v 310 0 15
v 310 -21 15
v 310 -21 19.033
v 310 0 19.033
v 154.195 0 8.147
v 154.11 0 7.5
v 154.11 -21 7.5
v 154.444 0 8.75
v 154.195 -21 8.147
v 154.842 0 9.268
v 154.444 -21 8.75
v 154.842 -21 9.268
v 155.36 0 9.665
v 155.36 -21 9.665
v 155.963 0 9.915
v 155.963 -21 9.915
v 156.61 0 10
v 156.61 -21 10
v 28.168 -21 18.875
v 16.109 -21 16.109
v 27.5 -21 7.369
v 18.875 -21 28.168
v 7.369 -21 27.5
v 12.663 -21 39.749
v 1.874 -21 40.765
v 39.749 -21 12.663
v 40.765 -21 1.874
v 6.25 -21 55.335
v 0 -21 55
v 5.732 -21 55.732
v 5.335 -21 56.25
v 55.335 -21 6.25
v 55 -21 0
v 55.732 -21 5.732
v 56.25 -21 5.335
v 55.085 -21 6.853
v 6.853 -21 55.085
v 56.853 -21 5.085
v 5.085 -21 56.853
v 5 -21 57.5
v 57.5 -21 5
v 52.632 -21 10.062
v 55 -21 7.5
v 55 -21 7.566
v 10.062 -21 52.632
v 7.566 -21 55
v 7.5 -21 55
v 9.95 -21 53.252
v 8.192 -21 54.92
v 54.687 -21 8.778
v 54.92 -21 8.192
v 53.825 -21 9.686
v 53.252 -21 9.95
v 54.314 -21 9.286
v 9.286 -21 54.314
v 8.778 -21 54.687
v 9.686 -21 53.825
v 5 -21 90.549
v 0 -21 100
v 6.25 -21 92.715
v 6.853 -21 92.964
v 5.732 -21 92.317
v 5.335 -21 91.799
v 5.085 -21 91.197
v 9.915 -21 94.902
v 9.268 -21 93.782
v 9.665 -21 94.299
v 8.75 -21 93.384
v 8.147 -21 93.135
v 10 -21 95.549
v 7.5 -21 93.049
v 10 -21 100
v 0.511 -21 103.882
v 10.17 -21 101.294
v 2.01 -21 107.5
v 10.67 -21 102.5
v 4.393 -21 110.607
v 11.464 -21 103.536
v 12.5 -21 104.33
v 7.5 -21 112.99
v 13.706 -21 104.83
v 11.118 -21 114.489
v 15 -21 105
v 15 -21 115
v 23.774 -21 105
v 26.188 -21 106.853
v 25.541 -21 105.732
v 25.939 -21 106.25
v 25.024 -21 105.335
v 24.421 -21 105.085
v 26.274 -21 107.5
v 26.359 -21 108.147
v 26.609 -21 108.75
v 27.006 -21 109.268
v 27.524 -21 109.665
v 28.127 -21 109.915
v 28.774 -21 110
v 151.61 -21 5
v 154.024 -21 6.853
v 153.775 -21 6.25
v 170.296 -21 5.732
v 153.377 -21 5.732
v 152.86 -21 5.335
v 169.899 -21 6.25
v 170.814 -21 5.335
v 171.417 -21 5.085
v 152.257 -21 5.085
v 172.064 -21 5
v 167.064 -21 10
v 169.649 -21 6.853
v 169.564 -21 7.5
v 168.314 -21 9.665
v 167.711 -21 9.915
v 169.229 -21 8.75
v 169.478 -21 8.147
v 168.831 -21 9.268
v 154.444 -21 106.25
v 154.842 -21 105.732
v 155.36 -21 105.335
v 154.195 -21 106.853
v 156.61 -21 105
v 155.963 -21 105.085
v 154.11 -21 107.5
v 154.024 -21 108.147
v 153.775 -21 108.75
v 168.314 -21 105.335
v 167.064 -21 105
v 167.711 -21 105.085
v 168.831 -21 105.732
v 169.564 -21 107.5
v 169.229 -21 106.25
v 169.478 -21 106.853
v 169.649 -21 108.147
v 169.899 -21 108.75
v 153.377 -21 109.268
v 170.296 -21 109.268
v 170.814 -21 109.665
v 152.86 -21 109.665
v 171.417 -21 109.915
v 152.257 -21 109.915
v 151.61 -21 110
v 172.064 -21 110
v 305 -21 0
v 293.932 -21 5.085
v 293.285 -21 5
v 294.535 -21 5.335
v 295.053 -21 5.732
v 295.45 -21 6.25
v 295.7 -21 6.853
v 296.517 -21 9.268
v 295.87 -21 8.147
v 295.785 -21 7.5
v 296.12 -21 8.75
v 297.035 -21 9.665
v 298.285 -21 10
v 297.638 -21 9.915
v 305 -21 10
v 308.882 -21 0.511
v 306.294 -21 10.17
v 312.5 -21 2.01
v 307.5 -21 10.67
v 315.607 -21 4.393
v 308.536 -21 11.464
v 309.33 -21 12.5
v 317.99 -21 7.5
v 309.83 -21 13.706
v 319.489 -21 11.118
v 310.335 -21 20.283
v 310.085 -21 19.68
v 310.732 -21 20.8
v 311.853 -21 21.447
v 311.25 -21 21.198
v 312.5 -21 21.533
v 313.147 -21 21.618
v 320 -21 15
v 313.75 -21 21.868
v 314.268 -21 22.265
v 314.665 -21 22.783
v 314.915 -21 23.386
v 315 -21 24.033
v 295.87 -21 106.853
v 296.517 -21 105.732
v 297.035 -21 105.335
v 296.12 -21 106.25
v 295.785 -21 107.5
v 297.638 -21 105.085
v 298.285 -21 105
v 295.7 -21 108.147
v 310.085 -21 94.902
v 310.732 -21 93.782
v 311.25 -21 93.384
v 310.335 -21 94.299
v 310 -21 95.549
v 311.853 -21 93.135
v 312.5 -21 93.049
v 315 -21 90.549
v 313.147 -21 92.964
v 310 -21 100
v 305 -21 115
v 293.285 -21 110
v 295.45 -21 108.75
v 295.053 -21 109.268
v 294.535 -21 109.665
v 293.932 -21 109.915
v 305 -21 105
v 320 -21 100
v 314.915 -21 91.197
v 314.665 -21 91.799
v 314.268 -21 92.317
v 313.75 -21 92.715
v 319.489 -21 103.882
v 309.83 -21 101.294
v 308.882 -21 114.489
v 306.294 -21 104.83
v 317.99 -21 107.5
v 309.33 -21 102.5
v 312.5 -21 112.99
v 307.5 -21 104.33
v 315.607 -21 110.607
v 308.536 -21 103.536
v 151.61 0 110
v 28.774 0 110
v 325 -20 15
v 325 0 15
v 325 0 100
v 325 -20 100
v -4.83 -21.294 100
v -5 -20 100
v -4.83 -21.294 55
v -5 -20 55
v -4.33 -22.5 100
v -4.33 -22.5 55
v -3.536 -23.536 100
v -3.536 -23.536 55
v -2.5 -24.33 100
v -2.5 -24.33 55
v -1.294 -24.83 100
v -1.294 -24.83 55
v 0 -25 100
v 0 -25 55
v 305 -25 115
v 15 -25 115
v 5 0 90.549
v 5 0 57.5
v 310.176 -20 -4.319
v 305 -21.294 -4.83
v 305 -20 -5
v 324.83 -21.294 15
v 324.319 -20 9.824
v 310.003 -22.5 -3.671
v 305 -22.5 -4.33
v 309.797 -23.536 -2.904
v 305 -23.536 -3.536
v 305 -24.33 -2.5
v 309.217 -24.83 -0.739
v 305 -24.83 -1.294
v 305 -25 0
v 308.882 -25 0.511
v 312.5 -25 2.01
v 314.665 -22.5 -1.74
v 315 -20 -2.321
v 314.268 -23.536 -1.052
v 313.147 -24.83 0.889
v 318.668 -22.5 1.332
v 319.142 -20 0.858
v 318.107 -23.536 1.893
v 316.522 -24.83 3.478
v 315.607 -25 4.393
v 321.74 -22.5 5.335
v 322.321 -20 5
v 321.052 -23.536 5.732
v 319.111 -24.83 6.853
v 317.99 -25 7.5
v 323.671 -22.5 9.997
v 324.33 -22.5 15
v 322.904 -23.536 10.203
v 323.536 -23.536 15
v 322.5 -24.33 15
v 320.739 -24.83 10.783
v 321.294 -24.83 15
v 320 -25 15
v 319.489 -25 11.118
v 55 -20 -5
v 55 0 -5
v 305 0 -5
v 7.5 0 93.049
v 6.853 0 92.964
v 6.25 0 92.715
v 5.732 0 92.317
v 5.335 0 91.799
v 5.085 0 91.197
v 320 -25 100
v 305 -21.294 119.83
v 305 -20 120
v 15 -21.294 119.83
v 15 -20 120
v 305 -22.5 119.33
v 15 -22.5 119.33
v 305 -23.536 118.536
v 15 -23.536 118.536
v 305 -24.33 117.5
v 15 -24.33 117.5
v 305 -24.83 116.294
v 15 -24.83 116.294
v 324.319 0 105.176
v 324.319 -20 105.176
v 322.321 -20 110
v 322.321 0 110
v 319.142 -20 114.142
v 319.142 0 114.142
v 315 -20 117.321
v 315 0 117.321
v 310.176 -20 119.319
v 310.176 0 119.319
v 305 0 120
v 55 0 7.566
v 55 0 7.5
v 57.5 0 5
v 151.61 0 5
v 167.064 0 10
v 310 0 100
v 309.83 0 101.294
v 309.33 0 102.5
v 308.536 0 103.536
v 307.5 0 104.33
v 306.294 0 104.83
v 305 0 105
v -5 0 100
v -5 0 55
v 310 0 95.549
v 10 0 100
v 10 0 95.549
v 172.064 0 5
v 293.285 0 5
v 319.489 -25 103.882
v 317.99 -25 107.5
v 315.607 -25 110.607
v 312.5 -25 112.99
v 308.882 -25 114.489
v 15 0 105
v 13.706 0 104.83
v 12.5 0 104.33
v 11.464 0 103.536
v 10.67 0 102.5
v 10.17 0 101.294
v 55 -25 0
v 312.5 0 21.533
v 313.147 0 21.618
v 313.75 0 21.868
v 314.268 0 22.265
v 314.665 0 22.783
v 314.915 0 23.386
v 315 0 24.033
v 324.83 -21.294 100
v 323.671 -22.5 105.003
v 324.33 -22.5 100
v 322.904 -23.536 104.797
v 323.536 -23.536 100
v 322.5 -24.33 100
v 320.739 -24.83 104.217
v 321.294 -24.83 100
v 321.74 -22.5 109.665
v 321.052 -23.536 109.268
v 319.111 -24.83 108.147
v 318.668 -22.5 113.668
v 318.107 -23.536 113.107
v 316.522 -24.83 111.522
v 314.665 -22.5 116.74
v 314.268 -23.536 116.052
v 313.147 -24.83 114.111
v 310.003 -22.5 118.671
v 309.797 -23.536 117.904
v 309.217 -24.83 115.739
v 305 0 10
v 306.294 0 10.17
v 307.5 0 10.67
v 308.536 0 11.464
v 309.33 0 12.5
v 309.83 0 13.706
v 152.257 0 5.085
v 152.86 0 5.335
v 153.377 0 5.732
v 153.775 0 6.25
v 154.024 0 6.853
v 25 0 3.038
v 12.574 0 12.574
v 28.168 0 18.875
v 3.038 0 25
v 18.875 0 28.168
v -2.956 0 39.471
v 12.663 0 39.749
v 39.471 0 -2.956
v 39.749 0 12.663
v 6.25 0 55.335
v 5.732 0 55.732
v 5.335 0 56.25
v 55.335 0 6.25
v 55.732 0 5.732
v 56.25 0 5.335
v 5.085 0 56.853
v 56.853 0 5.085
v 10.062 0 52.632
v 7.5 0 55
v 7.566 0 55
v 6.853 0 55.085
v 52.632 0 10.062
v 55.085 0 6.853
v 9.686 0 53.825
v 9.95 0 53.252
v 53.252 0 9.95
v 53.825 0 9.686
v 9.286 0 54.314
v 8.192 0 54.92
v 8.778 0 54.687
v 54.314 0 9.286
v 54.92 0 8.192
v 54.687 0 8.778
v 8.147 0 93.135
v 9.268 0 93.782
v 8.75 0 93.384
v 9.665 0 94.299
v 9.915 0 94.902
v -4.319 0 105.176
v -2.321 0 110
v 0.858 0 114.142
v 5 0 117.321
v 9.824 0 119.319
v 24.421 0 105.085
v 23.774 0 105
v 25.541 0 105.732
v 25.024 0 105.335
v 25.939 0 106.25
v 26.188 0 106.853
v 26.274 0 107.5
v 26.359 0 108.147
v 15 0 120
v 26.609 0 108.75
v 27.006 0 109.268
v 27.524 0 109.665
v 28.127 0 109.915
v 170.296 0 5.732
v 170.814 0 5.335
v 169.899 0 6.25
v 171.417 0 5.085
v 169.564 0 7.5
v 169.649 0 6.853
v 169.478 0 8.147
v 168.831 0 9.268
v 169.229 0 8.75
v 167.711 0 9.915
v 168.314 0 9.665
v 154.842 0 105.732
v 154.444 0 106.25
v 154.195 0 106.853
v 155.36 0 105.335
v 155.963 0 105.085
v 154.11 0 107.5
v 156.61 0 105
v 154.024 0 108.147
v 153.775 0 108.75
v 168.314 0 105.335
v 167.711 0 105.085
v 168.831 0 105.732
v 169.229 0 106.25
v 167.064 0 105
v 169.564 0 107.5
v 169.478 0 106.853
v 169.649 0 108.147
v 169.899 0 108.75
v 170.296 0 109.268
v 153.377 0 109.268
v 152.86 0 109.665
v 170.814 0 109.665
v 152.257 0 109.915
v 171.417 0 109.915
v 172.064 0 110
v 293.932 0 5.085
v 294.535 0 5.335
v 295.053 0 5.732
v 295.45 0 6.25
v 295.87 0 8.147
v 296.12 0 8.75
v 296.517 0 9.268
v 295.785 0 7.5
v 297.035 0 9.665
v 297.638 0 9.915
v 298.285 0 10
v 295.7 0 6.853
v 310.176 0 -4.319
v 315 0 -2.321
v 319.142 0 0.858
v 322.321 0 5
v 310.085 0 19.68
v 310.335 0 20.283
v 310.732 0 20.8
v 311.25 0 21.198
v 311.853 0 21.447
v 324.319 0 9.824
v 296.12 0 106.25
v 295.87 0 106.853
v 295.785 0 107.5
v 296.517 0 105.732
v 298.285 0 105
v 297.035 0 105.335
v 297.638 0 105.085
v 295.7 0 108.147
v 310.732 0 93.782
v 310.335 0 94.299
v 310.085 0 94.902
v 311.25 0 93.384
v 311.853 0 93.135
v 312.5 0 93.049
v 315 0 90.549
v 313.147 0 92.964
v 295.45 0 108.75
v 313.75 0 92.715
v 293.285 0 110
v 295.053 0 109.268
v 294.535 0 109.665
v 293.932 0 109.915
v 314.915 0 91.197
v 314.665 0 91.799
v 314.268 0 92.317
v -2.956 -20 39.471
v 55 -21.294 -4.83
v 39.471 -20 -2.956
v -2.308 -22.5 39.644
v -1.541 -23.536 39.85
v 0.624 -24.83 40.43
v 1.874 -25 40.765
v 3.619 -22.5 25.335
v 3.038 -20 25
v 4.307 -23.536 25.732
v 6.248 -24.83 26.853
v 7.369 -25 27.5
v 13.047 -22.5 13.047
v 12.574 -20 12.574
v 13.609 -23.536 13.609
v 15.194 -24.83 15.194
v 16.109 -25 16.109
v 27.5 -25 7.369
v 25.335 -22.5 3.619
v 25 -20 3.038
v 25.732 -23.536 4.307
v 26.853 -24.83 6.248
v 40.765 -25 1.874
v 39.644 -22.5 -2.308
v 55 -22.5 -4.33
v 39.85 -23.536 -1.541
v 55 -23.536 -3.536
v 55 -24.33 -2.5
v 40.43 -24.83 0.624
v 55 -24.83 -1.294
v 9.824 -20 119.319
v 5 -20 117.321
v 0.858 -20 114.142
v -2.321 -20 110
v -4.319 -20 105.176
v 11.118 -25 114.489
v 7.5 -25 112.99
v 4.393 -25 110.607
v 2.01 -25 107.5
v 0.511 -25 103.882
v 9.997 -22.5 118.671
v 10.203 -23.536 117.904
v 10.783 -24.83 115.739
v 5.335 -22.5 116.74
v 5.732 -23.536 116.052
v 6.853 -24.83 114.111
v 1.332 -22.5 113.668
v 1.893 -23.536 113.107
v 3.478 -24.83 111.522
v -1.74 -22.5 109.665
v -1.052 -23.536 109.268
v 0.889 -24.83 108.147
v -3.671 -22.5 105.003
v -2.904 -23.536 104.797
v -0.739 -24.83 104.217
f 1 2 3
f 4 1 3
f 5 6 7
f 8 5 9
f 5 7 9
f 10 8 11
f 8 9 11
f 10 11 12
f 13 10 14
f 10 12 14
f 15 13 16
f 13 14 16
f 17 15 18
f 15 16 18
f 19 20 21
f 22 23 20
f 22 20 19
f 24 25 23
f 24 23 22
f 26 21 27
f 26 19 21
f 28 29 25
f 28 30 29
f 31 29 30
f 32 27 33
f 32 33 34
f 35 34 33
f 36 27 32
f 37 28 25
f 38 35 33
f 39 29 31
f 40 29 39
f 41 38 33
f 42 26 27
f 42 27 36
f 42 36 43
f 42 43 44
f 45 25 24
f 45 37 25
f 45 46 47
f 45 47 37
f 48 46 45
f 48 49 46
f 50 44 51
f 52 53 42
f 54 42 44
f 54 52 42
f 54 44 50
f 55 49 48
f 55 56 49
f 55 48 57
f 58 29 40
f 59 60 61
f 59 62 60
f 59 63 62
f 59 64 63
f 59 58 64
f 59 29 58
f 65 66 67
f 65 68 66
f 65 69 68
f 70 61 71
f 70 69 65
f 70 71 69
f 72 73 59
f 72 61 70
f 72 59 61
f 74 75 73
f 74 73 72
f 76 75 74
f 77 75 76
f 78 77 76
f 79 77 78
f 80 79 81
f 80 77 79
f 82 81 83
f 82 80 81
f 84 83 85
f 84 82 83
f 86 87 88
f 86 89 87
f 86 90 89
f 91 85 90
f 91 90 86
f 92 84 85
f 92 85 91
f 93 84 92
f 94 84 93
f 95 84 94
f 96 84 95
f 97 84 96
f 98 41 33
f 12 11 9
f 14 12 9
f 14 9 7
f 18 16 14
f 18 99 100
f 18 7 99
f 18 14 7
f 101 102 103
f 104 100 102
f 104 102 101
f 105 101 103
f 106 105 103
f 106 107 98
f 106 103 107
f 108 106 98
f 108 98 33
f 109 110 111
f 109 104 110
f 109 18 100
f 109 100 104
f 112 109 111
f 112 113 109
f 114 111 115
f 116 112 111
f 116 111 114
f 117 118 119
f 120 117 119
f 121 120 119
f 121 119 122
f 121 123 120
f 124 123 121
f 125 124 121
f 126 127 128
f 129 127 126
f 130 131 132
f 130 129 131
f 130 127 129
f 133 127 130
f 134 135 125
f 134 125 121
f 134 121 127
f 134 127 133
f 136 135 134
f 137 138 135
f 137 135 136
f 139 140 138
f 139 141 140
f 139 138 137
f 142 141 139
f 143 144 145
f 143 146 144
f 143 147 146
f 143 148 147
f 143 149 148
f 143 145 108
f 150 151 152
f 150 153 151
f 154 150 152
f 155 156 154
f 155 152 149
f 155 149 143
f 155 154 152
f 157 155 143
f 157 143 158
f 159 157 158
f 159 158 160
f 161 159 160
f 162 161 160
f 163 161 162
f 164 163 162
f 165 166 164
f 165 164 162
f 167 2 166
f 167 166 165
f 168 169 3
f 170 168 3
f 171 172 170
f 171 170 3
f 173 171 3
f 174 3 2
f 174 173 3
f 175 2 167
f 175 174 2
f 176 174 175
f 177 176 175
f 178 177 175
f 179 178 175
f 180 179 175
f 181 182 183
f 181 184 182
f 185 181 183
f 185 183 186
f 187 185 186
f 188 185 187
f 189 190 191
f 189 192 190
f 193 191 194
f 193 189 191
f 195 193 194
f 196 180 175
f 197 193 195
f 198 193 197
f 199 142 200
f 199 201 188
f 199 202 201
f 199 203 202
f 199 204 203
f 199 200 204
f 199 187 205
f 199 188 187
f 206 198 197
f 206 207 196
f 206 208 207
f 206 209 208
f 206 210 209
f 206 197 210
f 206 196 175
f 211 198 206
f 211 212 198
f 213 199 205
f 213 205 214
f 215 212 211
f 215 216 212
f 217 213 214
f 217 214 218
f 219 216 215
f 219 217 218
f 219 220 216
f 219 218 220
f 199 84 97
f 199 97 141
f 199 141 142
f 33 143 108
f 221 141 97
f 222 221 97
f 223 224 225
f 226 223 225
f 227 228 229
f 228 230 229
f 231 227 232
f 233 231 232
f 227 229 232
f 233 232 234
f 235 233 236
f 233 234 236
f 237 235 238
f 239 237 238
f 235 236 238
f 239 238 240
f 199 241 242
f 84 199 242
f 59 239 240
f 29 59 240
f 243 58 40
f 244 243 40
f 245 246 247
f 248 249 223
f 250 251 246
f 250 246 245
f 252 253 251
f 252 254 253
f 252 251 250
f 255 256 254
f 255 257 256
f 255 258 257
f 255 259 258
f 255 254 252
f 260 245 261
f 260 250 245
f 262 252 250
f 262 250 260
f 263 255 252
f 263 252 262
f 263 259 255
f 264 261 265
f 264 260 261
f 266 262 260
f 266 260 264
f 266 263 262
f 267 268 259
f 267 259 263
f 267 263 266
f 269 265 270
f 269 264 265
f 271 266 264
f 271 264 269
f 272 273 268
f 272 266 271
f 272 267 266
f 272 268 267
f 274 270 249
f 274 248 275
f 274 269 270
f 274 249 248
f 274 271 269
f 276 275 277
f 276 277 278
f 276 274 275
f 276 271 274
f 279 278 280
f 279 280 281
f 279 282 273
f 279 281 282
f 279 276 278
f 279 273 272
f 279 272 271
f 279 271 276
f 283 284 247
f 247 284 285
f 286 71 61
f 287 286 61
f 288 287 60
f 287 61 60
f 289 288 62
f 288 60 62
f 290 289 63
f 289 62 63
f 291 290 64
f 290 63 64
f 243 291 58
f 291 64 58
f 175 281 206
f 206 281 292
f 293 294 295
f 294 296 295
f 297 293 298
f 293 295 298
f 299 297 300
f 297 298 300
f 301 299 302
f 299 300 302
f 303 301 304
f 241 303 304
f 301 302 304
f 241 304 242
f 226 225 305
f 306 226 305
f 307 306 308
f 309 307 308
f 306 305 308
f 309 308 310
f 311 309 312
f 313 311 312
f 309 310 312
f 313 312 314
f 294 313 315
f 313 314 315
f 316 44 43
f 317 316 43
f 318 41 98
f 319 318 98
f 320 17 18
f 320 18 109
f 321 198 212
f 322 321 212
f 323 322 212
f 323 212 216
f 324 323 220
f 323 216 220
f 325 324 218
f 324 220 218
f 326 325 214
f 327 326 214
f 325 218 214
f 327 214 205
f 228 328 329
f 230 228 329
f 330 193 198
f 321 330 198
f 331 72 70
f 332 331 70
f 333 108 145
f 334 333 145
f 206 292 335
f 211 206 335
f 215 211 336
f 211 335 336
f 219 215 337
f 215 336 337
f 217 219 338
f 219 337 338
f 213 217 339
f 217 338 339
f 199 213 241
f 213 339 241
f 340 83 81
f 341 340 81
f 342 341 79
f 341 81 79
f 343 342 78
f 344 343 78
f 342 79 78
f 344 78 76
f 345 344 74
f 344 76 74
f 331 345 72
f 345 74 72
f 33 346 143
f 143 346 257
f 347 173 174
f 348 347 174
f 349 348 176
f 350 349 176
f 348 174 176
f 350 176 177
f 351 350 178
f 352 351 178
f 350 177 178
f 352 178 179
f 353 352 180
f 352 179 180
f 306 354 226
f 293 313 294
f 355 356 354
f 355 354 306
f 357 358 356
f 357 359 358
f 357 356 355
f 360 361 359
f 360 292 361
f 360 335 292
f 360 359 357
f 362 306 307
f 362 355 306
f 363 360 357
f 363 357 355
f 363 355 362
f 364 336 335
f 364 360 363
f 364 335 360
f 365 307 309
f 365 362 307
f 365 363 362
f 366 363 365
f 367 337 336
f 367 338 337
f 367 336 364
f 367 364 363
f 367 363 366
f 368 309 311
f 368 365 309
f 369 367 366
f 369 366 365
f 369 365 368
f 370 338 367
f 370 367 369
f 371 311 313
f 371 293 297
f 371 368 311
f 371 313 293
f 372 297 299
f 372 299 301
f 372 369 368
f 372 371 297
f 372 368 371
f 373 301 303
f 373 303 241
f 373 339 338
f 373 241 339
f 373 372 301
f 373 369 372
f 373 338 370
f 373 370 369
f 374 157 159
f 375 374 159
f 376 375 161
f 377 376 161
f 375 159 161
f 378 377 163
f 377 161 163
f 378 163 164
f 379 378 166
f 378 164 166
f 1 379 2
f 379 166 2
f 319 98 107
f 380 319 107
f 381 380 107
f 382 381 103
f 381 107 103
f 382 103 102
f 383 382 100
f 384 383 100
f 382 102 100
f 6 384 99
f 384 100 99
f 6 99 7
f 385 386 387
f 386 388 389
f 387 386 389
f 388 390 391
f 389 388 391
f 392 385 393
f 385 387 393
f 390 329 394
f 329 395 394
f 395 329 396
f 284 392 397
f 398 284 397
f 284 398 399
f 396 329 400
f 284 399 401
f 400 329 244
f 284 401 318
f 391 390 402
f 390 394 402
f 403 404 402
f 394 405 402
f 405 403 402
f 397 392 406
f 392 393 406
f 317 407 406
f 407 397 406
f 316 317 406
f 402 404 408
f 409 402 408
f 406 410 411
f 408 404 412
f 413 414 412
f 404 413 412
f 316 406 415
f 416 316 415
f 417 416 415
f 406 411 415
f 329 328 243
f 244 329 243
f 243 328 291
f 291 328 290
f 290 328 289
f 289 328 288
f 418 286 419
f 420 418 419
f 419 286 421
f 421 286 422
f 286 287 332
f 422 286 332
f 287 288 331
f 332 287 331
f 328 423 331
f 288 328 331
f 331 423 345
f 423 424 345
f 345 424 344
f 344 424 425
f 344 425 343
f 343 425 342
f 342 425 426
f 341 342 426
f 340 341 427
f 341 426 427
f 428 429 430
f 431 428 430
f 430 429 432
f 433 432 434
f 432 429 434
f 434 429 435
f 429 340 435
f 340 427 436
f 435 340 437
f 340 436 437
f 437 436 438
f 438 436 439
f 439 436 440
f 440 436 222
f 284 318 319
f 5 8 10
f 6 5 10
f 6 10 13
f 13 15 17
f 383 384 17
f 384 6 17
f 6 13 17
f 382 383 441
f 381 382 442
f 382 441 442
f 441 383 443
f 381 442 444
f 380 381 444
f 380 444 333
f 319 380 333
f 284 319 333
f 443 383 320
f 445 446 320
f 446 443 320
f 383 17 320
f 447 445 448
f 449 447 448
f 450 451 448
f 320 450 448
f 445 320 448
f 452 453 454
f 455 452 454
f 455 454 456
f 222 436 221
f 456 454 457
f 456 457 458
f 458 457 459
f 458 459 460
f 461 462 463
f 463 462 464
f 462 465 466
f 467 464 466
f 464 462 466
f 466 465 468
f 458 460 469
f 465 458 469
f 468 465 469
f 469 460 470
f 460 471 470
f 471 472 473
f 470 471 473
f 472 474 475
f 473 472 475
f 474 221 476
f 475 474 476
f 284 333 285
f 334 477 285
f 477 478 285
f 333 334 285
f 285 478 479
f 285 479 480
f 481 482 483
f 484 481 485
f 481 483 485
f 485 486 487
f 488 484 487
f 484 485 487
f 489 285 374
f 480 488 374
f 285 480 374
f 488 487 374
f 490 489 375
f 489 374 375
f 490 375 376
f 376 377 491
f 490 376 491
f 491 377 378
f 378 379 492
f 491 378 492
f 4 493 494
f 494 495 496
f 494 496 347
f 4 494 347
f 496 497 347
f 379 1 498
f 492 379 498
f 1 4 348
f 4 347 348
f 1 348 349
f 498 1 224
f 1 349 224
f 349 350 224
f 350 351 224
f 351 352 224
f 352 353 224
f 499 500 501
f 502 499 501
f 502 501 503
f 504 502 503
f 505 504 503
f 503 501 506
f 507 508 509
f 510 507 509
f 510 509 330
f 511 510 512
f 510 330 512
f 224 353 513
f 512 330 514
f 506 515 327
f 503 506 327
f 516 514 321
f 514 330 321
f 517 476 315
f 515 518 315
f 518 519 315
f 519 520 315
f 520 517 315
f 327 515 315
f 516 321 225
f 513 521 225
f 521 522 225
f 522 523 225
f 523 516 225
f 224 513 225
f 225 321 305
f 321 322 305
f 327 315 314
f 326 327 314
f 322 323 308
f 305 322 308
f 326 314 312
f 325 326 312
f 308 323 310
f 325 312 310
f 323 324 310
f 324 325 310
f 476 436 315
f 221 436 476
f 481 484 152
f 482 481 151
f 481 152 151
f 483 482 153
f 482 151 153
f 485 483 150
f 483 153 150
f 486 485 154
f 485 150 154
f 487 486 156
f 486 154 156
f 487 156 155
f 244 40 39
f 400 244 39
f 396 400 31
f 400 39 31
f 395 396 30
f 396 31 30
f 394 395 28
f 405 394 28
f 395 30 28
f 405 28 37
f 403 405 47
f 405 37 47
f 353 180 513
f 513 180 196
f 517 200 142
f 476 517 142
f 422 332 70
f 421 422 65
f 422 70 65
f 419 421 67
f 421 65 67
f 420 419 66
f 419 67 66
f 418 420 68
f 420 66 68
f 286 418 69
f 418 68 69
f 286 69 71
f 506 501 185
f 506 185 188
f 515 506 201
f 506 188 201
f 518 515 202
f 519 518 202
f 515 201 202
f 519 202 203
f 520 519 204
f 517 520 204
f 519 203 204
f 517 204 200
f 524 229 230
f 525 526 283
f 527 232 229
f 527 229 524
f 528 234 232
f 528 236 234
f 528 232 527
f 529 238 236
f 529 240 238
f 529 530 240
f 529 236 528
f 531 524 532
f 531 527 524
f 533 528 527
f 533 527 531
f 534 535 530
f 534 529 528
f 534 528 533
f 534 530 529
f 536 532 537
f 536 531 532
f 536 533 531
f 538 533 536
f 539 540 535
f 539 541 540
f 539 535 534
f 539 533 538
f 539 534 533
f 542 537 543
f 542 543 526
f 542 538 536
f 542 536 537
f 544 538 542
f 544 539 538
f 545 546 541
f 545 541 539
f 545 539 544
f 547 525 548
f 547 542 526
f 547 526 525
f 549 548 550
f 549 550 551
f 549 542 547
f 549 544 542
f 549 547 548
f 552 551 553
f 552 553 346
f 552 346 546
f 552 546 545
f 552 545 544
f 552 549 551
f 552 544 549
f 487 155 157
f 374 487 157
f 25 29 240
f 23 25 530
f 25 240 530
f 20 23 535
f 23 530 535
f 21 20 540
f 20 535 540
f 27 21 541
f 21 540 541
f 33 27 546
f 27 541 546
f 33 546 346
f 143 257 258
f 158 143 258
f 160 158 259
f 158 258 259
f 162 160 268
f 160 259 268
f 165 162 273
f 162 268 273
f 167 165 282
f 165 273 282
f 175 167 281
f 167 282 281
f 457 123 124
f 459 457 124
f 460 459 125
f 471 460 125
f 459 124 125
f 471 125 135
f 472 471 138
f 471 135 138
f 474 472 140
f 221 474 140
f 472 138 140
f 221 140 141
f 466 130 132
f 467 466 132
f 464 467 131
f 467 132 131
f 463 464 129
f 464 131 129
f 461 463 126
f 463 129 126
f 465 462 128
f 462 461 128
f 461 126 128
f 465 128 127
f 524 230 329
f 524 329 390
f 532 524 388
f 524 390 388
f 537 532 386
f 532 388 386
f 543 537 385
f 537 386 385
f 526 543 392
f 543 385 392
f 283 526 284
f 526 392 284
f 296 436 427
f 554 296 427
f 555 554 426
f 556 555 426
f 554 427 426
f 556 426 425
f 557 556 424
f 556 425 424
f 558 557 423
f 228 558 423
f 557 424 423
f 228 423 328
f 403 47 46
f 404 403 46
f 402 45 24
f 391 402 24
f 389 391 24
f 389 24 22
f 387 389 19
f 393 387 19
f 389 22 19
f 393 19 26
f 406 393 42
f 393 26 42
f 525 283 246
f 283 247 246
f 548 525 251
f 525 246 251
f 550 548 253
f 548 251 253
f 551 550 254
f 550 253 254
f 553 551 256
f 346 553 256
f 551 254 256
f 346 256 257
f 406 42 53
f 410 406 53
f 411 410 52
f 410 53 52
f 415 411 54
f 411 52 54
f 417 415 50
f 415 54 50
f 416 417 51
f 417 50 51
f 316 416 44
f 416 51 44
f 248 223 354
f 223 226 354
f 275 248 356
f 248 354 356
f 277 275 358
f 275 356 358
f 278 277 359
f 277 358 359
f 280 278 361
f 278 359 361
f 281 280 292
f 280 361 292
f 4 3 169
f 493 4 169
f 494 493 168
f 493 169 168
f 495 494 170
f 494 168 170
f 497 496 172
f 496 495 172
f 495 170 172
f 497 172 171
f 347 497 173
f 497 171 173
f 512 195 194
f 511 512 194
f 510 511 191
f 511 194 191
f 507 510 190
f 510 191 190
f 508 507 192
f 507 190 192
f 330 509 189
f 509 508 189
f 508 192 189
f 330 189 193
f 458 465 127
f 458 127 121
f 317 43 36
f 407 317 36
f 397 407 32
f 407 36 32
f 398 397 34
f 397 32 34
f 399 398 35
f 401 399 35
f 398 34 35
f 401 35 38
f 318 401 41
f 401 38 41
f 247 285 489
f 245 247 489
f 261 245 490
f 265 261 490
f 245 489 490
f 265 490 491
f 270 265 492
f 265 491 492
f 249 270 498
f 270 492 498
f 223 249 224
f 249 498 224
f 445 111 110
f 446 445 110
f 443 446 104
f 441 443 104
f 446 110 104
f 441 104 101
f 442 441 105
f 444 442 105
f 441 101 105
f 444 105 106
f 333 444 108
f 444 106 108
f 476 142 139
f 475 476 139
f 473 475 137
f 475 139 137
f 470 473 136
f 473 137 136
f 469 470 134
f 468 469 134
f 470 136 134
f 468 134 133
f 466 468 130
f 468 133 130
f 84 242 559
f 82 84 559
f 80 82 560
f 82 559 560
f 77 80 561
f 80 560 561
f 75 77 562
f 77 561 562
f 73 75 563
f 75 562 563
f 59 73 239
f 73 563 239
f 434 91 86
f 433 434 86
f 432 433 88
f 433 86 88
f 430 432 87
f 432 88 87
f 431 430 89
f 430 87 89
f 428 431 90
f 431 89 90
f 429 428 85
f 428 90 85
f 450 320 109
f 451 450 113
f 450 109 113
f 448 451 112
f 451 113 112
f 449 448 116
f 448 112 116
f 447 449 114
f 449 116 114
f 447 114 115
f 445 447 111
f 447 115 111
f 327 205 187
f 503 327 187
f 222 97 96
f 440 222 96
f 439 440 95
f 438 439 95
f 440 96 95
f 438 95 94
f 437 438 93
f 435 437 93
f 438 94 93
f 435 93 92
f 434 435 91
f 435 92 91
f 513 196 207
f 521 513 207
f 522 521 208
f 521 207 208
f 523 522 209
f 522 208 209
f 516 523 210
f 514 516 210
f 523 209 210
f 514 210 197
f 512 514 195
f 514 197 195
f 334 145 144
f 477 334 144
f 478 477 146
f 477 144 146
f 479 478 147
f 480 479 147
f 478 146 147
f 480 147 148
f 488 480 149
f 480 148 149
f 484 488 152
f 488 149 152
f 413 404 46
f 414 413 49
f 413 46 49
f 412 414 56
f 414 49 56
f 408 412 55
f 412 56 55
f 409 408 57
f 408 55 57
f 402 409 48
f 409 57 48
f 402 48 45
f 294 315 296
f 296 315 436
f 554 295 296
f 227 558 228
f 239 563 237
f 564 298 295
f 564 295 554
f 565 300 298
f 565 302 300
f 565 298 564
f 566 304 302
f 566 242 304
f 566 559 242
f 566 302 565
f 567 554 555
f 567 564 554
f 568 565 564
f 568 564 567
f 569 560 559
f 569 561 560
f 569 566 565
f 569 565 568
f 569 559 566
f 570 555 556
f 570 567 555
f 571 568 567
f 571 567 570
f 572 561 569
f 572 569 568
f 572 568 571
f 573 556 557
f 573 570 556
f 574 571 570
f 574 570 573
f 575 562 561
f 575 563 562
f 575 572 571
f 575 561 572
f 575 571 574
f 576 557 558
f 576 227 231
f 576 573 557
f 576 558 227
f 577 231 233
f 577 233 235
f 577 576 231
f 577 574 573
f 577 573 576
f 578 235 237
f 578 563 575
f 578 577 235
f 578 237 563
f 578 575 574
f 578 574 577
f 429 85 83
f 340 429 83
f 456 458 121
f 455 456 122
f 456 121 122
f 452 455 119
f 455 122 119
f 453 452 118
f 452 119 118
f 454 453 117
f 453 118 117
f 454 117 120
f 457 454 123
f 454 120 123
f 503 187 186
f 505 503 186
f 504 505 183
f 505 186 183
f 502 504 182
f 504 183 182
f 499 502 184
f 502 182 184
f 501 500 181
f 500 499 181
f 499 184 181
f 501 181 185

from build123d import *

# Parameters (mm, degrees)
F2_DEPTH = 25
F3_R     = 5
F4_DEPTH = 4
F6_DEPTH = 25


with BuildPart() as f2:
    # F1 (on Front) → F2 (new body)
    with BuildSketch(Plane.XZ):
        with BuildLine():
            Line((-4.9999973178, 100), (-4.9999973178, 55))
            ThreePointArc((-4.9999973178, 55), (12.5735950254, 12.5735950254), (55, -4.9999973178))
            Line((55, -4.9999973178), (305, -4.9999973178))
            ThreePointArc((305, -4.9999973178), (319.1421337271, 0.8578662729), (324.9999973178, 15))
            Line((324.9999973178, 15), (324.9999973178, 100))
            ThreePointArc((324.9999973178, 100), (319.1421337271, 114.1421337271), (305, 119.9999973178))
            Line((305, 119.9999973178), (15, 119.9999973178))
            ThreePointArc((15, 119.9999973178), (0.8578662729, 114.1421337271), (-4.9999973178, 100))
        make_face()
    extrude(amount=F2_DEPTH)

    # F3
    f3_edges = [f2.edges().sort_by_distance(p)[0] for p in [
        (160, -25, 119.999997),
        (0.857866, -25, 114.142134),
        (-4.999997, -25, 77.5),
        (12.573595, -25, 12.573595),
        (180, -25, -4.999997),
        (319.142134, -25, 0.857866),
        (324.999997, -25, 57.5),
        (319.142134, -25, 114.142134),
    ]]
    fillet(f3_edges, radius=F3_R)

    # F2_face (on face) + F0 (on Front) + F2_face1 (on face) → F4 (cut)
    with BuildSketch(Plane(origin=(162.4531537348, -25, 58.2425840515), x_dir=(1, 0, 0), z_dir=(0, -1, 0))):
        with BuildLine():
            Line((142.5468462652, 56.7574132663), (-147.4531537348, 56.7574132663))
            ThreePointArc((-147.4531537348, 56.7574132663), (-158.059753556, 52.3640157697), (-162.4531510526, 41.7574159485))
            Line((-162.4531510526, 41.7574159485), (-162.4531510526, -3.2425840515))
            ThreePointArc((-162.4531510526, -3.2425840515), (-146.3440248034, -42.1334551202), (-107.4531537348, -58.2425813693))
            Line((-107.4531537348, -58.2425813693), (142.5468462652, -58.2425813693))
            ThreePointArc((142.5468462652, -58.2425813693), (153.1534460864, -53.8491838727), (157.546843583, -43.2425840515))
            Line((157.546843583, -43.2425840515), (157.546843583, 41.7574159485))
            ThreePointArc((157.546843583, 41.7574159485), (153.1534460864, 52.3640157697), (142.5468462652, 56.7574132663))
        make_face()
    with BuildSketch(Plane.XZ):
        with BuildLine():
            Line((186.9708299637, 115), (189.8719519377, 0))
            Line((189.8719519377, 0), (305, 0))
            ThreePointArc((305, 0), (315.6066017178, 4.3933982822), (320, 15))
            Line((320, 15), (320, 100))
            ThreePointArc((320, 100), (315.6066017178, 110.6066017178), (305, 115))
            Line((305, 115), (186.9708299637, 115))
        make_face()
    with BuildSketch(Plane(origin=(162.5693555517, 0, 58.3192422461), x_dir=(1, 0, 0), z_dir=(0, 1, 0))):
        with BuildLine():
            Line((-167.5693528695, 3.3192422461), (-167.5693528695, -41.6807577539))
            ThreePointArc((-167.5693528695, -41.6807577539), (-161.7114892788, -55.8228914811), (-147.5693555517, -61.6807550717))
            Line((-147.5693555517, -61.6807550717), (142.4306444483, -61.6807550717))
            ThreePointArc((142.4306444483, -61.6807550717), (156.5727781754, -55.8228914811), (162.4306417661, -41.6807577539))
            Line((162.4306417661, -41.6807577539), (162.4306417661, 43.3192422461))
            ThreePointArc((162.4306417661, 43.3192422461), (156.5727781754, 57.4613759732), (142.4306444483, 63.3192395638))
            Line((142.4306444483, 63.3192395638), (-107.5693555517, 63.3192395638))
            ThreePointArc((-107.5693555517, 63.3192395638), (-149.9957605263, 45.7456472206), (-167.5693528695, 3.3192422461))
        make_face()
    extrude(amount=-F4_DEPTH, dir=(0, -1, 0), mode=Mode.SUBTRACT)

    # F5 (on face) → F6 (cut)
    with BuildSketch(Plane.XZ.offset(21)):
        with BuildLine():
            Line((298.2851588726, 10.0000026822), (305, 10.0000026822))
            ThreePointArc((305, 10.0000026822), (308.5355320093, 11.4644679907), (309.9999973178, 15))
            Line((309.9999973178, 15), (309.9999973178, 19.0326044708))
            ThreePointArc((309.9999973178, 19.0326044708), (310.7322303648, 20.8003714238), (312.4999973178, 21.5326044708))
            ThreePointArc((312.4999973178, 21.5326044708), (314.2677642708, 22.2648375179), (314.9999973178, 24.0326044708))
            Line((314.9999973178, 24.0326044708), (314.9999973178, 90.5494615436))
            ThreePointArc((314.9999973178, 90.5494615436), (314.2677642708, 92.3172284965), (312.4999973178, 93.0494615436))
            ThreePointArc((312.4999973178, 93.0494615436), (310.7322303648, 93.7816945906), (309.9999973178, 95.5494615436))
            Line((309.9999973178, 95.5494615436), (309.9999973178, 100))
            ThreePointArc((309.9999973178, 100), (308.5355320093, 103.5355320093), (305, 104.9999973178))
            Line((305, 104.9999973178), (298.2851588726, 104.9999973178))
            ThreePointArc((298.2851588726, 104.9999973178), (296.5173919196, 105.7322303648), (295.7851588726, 107.4999973178))
            ThreePointArc((295.7851588726, 107.4999973178), (295.0529258256, 109.2677642708), (293.2851588726, 109.9999973178))
            Line((293.2851588726, 109.9999973178), (172.0636063814, 109.9999973178))
            ThreePointArc((172.0636063814, 109.9999973178), (170.2958394284, 109.2677642708), (169.5636063814, 107.4999973178))
            ThreePointArc((169.5636063814, 107.4999973178), (168.8313733344, 105.7322303648), (167.0636063814, 104.9999973178))
            Line((167.0636063814, 104.9999973178), (156.6095525026, 104.9999973178))
            ThreePointArc((156.6095525026, 104.9999973178), (154.8417855497, 105.7322303648), (154.1095525026, 107.4999973178))
            ThreePointArc((154.1095525026, 107.4999973178), (153.3773194556, 109.2677642708), (151.6095525026, 109.9999973178))
            Line((151.6095525026, 109.9999973178), (28.7736566365, 109.9999973178))
            ThreePointArc((28.7736566365, 109.9999973178), (27.0058896835, 109.2677642708), (26.2736566365, 107.4999973178))
            ThreePointArc((26.2736566365, 107.4999973178), (25.5414235894, 105.7322303648), (23.7736566365, 104.9999973178))
            Line((23.7736566365, 104.9999973178), (15, 104.9999973178))
            ThreePointArc((15, 104.9999973178), (11.4644679907, 103.5355320093), (10.0000026822, 100))
            Line((10.0000026822, 100), (10.0000026822, 95.5494615436))
            ThreePointArc((10.0000026822, 95.5494615436), (9.2677696352, 93.7816945906), (7.5000026822, 93.0494615436))
            ThreePointArc((7.5000026822, 93.0494615436), (5.7322357292, 92.3172284965), (5.0000026822, 90.5494615436))
            Line((5.0000026822, 90.5494615436), (5.0000026822, 57.5))
            ThreePointArc((5.0000026822, 57.5), (5.7322357292, 55.732233047), (7.5000026822, 55))
            Line((7.5000026822, 55), (7.5658377834, 55))
            ThreePointArc((7.5658377834, 55), (9.2864557847, 54.3136906278), (10.0623727779, 52.6315789548))
            ThreePointArc((10.0623727779, 52.6315789548), (23.1801967432, 23.1801967432), (52.6315789548, 10.0623727779))
            ThreePointArc((52.6315789548, 10.0623727779), (54.3136906278, 9.2864557847), (55, 7.5658377834))
            Line((55, 7.5658377834), (55, 7.5000026822))
            ThreePointArc((55, 7.5000026822), (55.732233047, 5.7322357292), (57.5, 5.0000026822))
            Line((57.5, 5.0000026822), (151.6095525026, 5.0000026822))
            ThreePointArc((151.6095525026, 5.0000026822), (153.3773194556, 5.7322357292), (154.1095525026, 7.5000026822))
            ThreePointArc((154.1095525026, 7.5000026822), (154.8417855497, 9.2677696352), (156.6095525026, 10.0000026822))
            Line((156.6095525026, 10.0000026822), (167.0636063814, 10.0000026822))
            ThreePointArc((167.0636063814, 10.0000026822), (168.8313733344, 9.2677696352), (169.5636063814, 7.5000026822))
            ThreePointArc((169.5636063814, 7.5000026822), (170.2958394284, 5.7322357292), (172.0636063814, 5.0000026822))
            Line((172.0636063814, 5.0000026822), (293.2851588726, 5.0000026822))
            ThreePointArc((293.2851588726, 5.0000026822), (295.0529258256, 5.7322357292), (295.7851588726, 7.5000026822))
            ThreePointArc((295.7851588726, 7.5000026822), (296.5173919196, 9.2677696352), (298.2851588726, 10.0000026822))
        make_face()
    extrude(amount=-F6_DEPTH, mode=Mode.SUBTRACT)


solid = f2.part
